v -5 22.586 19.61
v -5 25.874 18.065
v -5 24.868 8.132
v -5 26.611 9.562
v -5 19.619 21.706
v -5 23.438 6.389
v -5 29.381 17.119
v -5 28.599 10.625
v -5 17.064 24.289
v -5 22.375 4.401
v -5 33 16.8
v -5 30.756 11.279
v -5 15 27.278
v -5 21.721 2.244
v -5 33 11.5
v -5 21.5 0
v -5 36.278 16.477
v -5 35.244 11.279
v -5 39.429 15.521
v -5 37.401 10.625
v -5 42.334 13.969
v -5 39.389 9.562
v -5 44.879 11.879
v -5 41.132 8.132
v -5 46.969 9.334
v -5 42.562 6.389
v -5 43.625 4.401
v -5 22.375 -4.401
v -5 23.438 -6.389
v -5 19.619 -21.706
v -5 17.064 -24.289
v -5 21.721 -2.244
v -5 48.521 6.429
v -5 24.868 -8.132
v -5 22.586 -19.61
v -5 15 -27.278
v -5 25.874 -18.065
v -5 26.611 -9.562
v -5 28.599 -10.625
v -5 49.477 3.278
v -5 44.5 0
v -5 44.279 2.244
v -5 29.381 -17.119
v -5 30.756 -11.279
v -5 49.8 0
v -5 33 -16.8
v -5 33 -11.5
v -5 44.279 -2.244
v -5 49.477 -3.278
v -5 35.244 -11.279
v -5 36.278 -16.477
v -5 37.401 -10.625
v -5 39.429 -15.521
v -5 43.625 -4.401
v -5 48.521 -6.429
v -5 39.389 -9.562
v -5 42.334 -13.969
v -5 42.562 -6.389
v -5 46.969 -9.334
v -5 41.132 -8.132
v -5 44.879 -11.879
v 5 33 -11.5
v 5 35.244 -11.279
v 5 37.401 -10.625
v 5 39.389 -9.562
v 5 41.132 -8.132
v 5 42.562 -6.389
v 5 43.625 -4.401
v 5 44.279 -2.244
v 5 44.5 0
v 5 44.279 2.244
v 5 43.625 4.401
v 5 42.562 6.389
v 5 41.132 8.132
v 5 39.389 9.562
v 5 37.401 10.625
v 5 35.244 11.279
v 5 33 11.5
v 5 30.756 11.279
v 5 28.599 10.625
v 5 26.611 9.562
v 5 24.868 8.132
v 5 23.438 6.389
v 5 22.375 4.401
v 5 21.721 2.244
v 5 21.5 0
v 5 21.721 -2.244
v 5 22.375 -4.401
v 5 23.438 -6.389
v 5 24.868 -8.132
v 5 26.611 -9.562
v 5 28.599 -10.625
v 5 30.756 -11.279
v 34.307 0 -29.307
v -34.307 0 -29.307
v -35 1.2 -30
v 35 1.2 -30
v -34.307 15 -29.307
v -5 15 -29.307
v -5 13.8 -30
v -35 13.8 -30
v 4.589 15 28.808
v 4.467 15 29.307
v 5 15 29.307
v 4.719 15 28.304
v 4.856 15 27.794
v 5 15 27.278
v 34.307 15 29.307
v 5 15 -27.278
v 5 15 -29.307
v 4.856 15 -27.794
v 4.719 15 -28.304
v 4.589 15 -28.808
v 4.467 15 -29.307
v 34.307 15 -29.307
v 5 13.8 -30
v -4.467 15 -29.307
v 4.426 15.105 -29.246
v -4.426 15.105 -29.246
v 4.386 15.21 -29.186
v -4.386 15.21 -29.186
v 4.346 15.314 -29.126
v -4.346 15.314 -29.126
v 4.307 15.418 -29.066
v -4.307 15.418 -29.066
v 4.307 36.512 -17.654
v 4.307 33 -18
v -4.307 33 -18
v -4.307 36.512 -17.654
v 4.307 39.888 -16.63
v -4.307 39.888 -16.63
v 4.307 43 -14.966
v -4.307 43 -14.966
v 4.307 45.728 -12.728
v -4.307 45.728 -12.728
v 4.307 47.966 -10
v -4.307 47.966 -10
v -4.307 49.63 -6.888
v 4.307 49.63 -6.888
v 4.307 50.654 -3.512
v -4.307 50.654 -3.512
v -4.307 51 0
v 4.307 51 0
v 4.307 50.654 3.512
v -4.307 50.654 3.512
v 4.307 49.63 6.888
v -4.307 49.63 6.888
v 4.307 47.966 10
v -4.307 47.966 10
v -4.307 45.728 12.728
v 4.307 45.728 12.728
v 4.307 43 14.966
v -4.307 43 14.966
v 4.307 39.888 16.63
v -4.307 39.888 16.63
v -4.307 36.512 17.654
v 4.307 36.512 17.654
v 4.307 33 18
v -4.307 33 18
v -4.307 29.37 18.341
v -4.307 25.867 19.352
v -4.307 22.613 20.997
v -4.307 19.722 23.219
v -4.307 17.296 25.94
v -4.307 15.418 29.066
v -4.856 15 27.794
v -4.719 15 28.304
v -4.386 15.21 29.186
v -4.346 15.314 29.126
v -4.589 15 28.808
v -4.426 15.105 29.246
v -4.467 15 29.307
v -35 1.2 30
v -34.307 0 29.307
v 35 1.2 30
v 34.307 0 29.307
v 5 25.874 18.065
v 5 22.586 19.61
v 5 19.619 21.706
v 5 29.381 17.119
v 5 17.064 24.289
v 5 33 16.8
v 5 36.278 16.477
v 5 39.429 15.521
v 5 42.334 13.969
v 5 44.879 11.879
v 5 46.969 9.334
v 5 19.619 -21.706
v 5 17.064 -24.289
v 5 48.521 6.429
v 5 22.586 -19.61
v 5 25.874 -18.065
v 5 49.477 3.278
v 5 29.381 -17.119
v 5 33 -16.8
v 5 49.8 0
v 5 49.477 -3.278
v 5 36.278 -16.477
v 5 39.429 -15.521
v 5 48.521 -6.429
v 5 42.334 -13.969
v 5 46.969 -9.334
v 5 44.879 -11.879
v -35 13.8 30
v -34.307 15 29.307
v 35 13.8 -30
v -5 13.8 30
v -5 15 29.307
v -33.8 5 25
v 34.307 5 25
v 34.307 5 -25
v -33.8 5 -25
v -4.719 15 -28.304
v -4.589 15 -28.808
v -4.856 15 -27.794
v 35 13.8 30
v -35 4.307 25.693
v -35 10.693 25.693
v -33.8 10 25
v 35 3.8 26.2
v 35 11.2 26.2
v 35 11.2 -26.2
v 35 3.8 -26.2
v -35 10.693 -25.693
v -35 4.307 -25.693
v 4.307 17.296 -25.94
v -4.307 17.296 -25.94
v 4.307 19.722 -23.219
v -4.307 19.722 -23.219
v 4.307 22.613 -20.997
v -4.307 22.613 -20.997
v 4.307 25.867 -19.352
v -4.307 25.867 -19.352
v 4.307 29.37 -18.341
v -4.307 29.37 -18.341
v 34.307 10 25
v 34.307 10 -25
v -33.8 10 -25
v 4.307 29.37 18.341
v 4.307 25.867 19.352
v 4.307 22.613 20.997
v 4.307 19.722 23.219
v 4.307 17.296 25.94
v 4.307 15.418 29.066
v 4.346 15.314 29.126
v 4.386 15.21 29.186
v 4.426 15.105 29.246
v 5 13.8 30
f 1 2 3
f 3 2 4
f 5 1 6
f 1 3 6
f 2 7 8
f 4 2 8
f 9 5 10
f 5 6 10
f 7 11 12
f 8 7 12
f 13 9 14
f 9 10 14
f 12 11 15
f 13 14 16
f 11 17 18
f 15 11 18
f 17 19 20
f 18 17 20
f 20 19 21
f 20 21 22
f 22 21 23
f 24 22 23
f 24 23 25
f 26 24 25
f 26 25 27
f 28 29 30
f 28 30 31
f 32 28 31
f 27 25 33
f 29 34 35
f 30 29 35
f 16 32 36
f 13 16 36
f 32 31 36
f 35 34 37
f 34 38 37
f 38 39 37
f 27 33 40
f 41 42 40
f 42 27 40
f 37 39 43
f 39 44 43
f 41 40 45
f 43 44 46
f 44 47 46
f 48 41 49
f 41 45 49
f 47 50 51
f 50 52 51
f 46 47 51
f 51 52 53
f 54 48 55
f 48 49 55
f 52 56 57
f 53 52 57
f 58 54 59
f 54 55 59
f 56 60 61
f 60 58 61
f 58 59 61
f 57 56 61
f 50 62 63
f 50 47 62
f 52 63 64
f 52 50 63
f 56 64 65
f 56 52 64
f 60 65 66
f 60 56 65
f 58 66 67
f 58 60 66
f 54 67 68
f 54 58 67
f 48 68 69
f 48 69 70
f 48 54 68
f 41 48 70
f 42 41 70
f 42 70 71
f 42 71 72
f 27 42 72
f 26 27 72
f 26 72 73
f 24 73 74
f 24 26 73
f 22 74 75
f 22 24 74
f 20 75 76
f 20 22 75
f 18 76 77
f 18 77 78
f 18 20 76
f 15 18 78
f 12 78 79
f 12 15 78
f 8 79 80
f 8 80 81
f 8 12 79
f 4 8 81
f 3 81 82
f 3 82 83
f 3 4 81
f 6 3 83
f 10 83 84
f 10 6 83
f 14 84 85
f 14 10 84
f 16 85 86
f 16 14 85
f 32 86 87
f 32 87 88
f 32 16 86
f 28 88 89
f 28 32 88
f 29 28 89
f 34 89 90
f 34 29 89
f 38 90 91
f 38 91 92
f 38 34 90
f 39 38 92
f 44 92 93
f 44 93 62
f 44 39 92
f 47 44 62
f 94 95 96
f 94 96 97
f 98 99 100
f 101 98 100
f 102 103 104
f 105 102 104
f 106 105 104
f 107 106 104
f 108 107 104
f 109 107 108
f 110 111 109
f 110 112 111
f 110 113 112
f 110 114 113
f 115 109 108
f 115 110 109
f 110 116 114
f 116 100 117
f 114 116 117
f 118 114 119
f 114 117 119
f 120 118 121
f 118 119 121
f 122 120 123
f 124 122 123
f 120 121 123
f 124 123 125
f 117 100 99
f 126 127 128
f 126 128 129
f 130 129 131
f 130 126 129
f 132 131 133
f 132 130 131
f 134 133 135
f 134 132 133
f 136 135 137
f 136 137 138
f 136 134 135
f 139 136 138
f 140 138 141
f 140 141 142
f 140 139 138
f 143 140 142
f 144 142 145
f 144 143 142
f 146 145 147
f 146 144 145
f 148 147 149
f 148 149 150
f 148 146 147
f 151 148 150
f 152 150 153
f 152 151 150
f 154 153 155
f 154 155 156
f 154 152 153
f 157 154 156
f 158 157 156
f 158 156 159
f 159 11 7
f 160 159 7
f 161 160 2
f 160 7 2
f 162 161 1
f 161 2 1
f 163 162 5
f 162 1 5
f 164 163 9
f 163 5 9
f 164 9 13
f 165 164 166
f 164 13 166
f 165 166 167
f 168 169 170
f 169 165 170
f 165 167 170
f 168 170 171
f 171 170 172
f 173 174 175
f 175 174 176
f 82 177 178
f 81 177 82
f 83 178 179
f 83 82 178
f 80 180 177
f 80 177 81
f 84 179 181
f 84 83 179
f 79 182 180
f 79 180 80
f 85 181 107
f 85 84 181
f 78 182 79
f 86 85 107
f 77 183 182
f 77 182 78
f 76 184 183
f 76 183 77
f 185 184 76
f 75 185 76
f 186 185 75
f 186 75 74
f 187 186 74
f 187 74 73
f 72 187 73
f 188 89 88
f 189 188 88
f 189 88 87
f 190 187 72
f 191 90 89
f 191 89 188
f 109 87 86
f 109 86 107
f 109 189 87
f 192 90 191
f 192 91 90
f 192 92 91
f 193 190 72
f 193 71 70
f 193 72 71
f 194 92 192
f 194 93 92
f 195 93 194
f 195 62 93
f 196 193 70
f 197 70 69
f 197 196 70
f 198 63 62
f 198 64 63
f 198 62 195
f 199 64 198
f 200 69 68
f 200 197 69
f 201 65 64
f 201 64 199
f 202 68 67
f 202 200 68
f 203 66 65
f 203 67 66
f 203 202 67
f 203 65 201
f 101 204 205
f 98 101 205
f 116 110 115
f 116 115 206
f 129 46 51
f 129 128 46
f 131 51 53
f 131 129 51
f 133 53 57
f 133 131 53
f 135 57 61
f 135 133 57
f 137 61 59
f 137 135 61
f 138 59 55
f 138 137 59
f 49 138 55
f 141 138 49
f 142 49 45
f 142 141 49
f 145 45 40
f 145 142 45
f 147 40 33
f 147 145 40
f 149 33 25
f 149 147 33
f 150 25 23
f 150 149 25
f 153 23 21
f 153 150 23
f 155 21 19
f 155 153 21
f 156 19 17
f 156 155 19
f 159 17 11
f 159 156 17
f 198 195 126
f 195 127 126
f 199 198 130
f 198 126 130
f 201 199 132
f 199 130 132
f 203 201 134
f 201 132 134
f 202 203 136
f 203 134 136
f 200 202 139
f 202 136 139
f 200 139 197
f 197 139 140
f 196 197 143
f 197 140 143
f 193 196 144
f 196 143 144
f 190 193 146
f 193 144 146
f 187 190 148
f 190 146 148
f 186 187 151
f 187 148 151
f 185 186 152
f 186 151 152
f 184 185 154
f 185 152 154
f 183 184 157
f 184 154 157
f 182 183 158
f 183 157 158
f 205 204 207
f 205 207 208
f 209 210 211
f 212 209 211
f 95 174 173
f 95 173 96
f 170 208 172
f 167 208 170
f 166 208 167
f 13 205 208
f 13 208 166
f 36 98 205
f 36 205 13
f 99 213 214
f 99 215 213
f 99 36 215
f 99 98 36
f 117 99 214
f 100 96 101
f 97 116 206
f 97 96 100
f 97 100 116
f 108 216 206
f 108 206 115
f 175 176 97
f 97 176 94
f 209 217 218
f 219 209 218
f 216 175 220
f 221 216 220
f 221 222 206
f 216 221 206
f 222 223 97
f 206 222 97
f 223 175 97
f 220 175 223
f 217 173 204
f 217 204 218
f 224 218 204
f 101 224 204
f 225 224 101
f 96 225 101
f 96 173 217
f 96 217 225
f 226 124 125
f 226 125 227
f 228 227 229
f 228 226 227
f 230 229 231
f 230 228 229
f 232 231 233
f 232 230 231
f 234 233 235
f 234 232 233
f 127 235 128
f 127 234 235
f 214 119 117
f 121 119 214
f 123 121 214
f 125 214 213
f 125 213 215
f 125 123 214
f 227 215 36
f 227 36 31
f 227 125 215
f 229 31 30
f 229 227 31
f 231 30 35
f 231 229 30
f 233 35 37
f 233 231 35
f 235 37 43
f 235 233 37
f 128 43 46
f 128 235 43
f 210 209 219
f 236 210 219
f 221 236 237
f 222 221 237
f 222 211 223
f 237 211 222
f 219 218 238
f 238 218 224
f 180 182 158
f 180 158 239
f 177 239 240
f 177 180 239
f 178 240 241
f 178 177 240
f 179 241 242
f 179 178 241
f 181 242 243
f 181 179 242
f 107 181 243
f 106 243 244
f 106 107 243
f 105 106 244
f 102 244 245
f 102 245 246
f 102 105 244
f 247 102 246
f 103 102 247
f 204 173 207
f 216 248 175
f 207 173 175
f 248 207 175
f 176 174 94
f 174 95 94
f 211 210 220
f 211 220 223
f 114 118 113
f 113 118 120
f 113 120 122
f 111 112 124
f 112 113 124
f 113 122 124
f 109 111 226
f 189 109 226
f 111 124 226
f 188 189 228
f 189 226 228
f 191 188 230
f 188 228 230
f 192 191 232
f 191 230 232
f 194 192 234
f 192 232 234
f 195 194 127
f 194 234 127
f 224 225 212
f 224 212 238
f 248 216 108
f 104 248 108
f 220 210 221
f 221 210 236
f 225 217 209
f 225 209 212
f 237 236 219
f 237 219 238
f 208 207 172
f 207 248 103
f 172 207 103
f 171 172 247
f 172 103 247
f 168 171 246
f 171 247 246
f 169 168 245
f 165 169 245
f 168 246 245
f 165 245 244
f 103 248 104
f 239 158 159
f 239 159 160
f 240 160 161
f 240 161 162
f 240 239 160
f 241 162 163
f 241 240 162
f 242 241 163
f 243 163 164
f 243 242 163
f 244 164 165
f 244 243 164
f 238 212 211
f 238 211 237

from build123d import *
from OCP.BRepFilletAPI import BRepFilletAPI_MakeChamfer

# Parameters (mm, degrees)
SKETCH_1_W               = 70
SKETCH_1_H               = 60
EXTRUDE_1_DEPTH          = 15
SKETCH_2_R               = 11.5
EXTRUDE_3_DEPTH          = 5
CUT_EXTRUDE_1_DEPTH      = 69.745908969
CUT_EXTRUDE_1_DEPTH_BACK = 69.745908969
SKETCH_3_W               = 50
SKETCH_3_H               = 5
CHAMFER_1_SIZE           = 1.2
CHAMFER_1_SIZE2          = 0.692820323
CHAMFER_2_SIZE           = 1.2
CHAMFER_2_SIZE_2         = 0.692820323
CHAMFER_3_SIZE           = 1.2
CHAMFER_3_SIZE_2         = 0.692820323
CHAMFER_4_SIZE           = 1.2
CHAMFER_4_SIZE2          = 0.692820323


with BuildPart() as part:
    # 스케치1 → 보스-돌출1 (new body)
    with BuildSketch(Plane(origin=(0, 0, 0), x_dir=(1, 0, 0), z_dir=(0, 1, 0))):
        Rectangle(SKETCH_1_W, SKETCH_1_H)
    extrude(amount=EXTRUDE_1_DEPTH)

    # 스케치2 → 보스-돌출3 (add, symmetric)
    with BuildSketch(Plane(origin=(0, 0, 0), x_dir=(0, 0, -1), z_dir=(1, 0, 0))):
        with BuildLine():
            ThreePointArc((30, 15), (21.27501926, 22.183346174), (18, 33))
            ThreePointArc((18, 33), (0, 51), (-18, 33))
            ThreePointArc((-18, 33), (-21.27501926, 22.183346174), (-30, 15))
            Line((-30, 15), (30, 15))
        make_face()
        with Locations((0, 33)):
            Circle(SKETCH_2_R, mode=Mode.SUBTRACT)
    extrude(amount=EXTRUDE_3_DEPTH, both=True)

    # 스케치3 → 컷-돌출1 (cut, two sides: drawn at the far end of the back side and taken through both)
    with BuildSketch(Plane(origin=(0, 0, 0), x_dir=(0, 0, -1), z_dir=(1, 0, 0)).offset(-CUT_EXTRUDE_1_DEPTH_BACK)):
        with Locations((0, 7.5)):
            Rectangle(SKETCH_3_W, SKETCH_3_H)
    extrude(amount=CUT_EXTRUDE_1_DEPTH + CUT_EXTRUDE_1_DEPTH_BACK, mode=Mode.SUBTRACT)

    # 모따기1: one chamfer whose edges measure the first distance from different faces: ONE call of the kernel's chamfer builder (chamfer() names one face for all edges)
    chamfer_1_edges_1 = [part.edges().sort_by_distance(p)[0] for p in [
        (0, 0, 30),
    ]]
    chamfer_1_side_1 = [part.faces().sort_by_distance(p)[0] for p in [
        (0, 7.5, 30),
    ]]
    chamfer_1_edges_2 = [part.edges().sort_by_distance(p)[0] for p in [
        (-35, 0, 0),
    ]]
    chamfer_1_side_2 = [part.faces().sort_by_distance(p)[0] for p in [
        (-35, 7.5, -29.381534156),
    ]]
    chamfer_1_edges_3 = [part.edges().sort_by_distance(p)[0] for p in [
        (0, 0, -30),
    ]]
    chamfer_1_side_3 = [part.faces().sort_by_distance(p)[0] for p in [
        (0, 7.5, -30),
    ]]
    chamfer_1_edges_4 = [part.edges().sort_by_distance(p)[0] for p in [
        (35, 0, 0),
    ]]
    chamfer_1_side_4 = [part.faces().sort_by_distance(p)[0] for p in [
        (35, 7.5, 29.381534156),
    ]]
    chamfer_1 = BRepFilletAPI_MakeChamfer(part.part.solid().wrapped)
    for e in chamfer_1_edges_1:
        chamfer_1.Add(CHAMFER_1_SIZE, CHAMFER_1_SIZE2, e.wrapped, chamfer_1_side_1[0].wrapped)  # the first distance lies on this face
    for e in chamfer_1_edges_2:
        chamfer_1.Add(CHAMFER_1_SIZE, CHAMFER_1_SIZE2, e.wrapped, chamfer_1_side_2[0].wrapped)  # the first distance lies on this face
    for e in chamfer_1_edges_3:
        chamfer_1.Add(CHAMFER_1_SIZE, CHAMFER_1_SIZE2, e.wrapped, chamfer_1_side_3[0].wrapped)  # the first distance lies on this face
    for e in chamfer_1_edges_4:
        chamfer_1.Add(CHAMFER_1_SIZE, CHAMFER_1_SIZE2, e.wrapped, chamfer_1_side_4[0].wrapped)  # the first distance lies on this face
    add(Compound.cast(chamfer_1.Shape()), mode=Mode.REPLACE)

    # 모따기2
    # the kernel refuses this chamfer: 1.2, 0.98830445, 0.692820323 mm, written as the material it takes off along each edge
    with BuildSketch(Plane(origin=(-35, 15, -33.104502906), x_dir=(0, -1, 0), z_dir=(0, 0, 1)), Plane(origin=(35, 15, 33.104502906), x_dir=(0, -1, 0), z_dir=(0, 0, -1))) as chamfer_2_piece_1:
        Polygon((CHAMFER_2_SIZE, 0), (0, CHAMFER_2_SIZE_2), (0, 0), align=None)
    extrude(amount=66.209005811, mode=Mode.SUBTRACT)
    with BuildSketch(Plane(origin=(-5, 15, -30), x_dir=(0, 0, 1), z_dir=(-1, 0, 0)), Plane(origin=(38.104502906, 15, -30), x_dir=(0, 0, 1), z_dir=(-1, 0, 0))) as chamfer_2_piece_2:
        Polygon((CHAMFER_2_SIZE_2, 0), (0, -CHAMFER_2_SIZE), (0, 0), align=None)
    extrude(amount=33.104502906, mode=Mode.SUBTRACT)
    with BuildSketch(Plane(origin=(5, 15, 30), x_dir=(0, -1, 0), z_dir=(1, 0, 0)), Plane(origin=(-38.104502906, 15, 30), x_dir=(0, -1, 0), z_dir=(1, 0, 0))) as chamfer_2_piece_3:
        Polygon((CHAMFER_2_SIZE, 0), (0, CHAMFER_2_SIZE_2), (0, 0), align=None)
    extrude(amount=33.104502906, mode=Mode.SUBTRACT)
    with BuildSketch(Plane(origin=(-5, 15, -30), x_dir=(0, -1, 0), z_dir=(1, 0, 0)), Plane(origin=(5, 15, 30), x_dir=(0, -1, 0), z_dir=(-1, 0, 0))) as chamfer_2_piece_4:
        with BuildLine():
            Line((CHAMFER_2_SIZE, 0), (-0.41845847, -0.934417434))
            ThreePointArc((-0.41845847, -0.934417434), (-0.211061153, -0.487718993), (0, 0))
            Line((0, 0), (CHAMFER_2_SIZE, 0))
        make_face()
    extrude(amount=10, mode=Mode.SUBTRACT)

    # 모따기3
    # the kernel refuses this chamfer: 1.2, 0.692820323 mm, written as the material it takes off along each edge
    with BuildSketch(Plane(origin=(5, 33, -37.5), x_dir=(0, -0.958795780822353, 0.2840961996881595), z_dir=(0, -0.2840961996881595, -0.958795780822353))) as chamfer_3_piece_1_section:
        Polygon((19.5 + CHAMFER_3_SIZE, 0), (19.5, CHAMFER_3_SIZE_2), (19.5, 0), align=None)
    chamfer_3_piece_1 = revolve(axis=Axis((5, 33, -37.5), (-1, 0, 0)), revolution_arc=73.495168323, mode=Mode.PRIVATE)
    chamfer_3_piece_1 = split(chamfer_3_piece_1, bisect_by=Plane(origin=(5, 15, -37.5), z_dir=(0, 1, 0)), keep=Keep.TOP, mode=Mode.PRIVATE)
    add(chamfer_3_piece_1, mode=Mode.SUBTRACT)
    with BuildSketch(Plane(origin=(5, 33, 37.5), x_dir=(0, 0, -1), z_dir=(0, 1, 0))) as chamfer_3_piece_2_section:
        Polygon((19.5, CHAMFER_3_SIZE_2), (19.5 + CHAMFER_3_SIZE, 0), (19.5, 0), align=None)
    chamfer_3_piece_2 = revolve(axis=Axis((5, 33, 37.5), (-1, 0, 0)), revolution_arc=73.495168323, mode=Mode.PRIVATE)
    chamfer_3_piece_2 = split(chamfer_3_piece_2, bisect_by=Plane(origin=(5, 15, 37.5), z_dir=(0, 1, 0)), keep=Keep.TOP, mode=Mode.PRIVATE)
    add(chamfer_3_piece_2, mode=Mode.SUBTRACT)
    with BuildSketch(Plane(origin=(5, 33, 0), x_dir=(0, 0, -1), z_dir=(0, -1, 0))) as chamfer_3_piece_3:
        Polygon((18 - CHAMFER_3_SIZE, 0), (18, -CHAMFER_3_SIZE_2), (18, 0), align=None)
    revolve(axis=Axis((5, 33, 0), (1, 0, 0)), revolution_arc=180, mode=Mode.SUBTRACT)
    with BuildSketch(Plane(origin=(-5, 33, -37.5), x_dir=(0, -0.958795780822353, 0.2840961996881595), z_dir=(0, -0.2840961996881595, -0.958795780822353))) as chamfer_3_piece_4_section:
        Polygon((19.5 + CHAMFER_3_SIZE, 0), (19.5, -CHAMFER_3_SIZE_2), (19.5, 0), align=None)
    chamfer_3_piece_4 = revolve(axis=Axis((-5, 33, -37.5), (-1, 0, 0)), revolution_arc=73.495168323, mode=Mode.PRIVATE)
    chamfer_3_piece_4 = split(chamfer_3_piece_4, bisect_by=Plane(origin=(-5, 15, -37.5), z_dir=(0, 1, 0)), keep=Keep.TOP, mode=Mode.PRIVATE)
    add(chamfer_3_piece_4, mode=Mode.SUBTRACT)
    with BuildSketch(Plane(origin=(-5, 33, 0), x_dir=(0, 0, -1), z_dir=(0, -1, 0))) as chamfer_3_piece_5:
        Polygon((18 - CHAMFER_3_SIZE, 0), (18, CHAMFER_3_SIZE_2), (18, 0), align=None)
    revolve(axis=Axis((-5, 33, 0), (1, 0, 0)), revolution_arc=180, mode=Mode.SUBTRACT)
    with BuildSketch(Plane(origin=(-5, 33, 37.5), x_dir=(0, 0, -1), z_dir=(0, 1, 0))) as chamfer_3_piece_6_section:
        Polygon((19.5, -CHAMFER_3_SIZE_2), (19.5 + CHAMFER_3_SIZE, 0), (19.5, 0), align=None)
    chamfer_3_piece_6 = revolve(axis=Axis((-5, 33, 37.5), (-1, 0, 0)), revolution_arc=73.495168323, mode=Mode.PRIVATE)
    chamfer_3_piece_6 = split(chamfer_3_piece_6, bisect_by=Plane(origin=(-5, 15, 37.5), z_dir=(0, 1, 0)), keep=Keep.TOP, mode=Mode.PRIVATE)
    add(chamfer_3_piece_6, mode=Mode.SUBTRACT)

    # 모따기4: one chamfer whose edges measure the first distance from different faces: ONE call of the kernel's chamfer builder (chamfer() names one face for all edges)
    chamfer_4_edges_1 = [part.edges().sort_by_distance(p)[0] for p in [
        (-35, 7.5, 25),
    ]]
    chamfer_4_side_1 = [part.faces().sort_by_distance(p)[0] for p in [
        (0, 7.5, 25),
    ]]
    chamfer_4_edges_2 = [part.edges().sort_by_distance(p)[0] for p in [
        (-35, 10, 0),
    ]]
    chamfer_4_side_2 = [part.faces().sort_by_distance(p)[0] for p in [
        (0, 10, 0),
    ]]
    chamfer_4_edges_3 = [part.edges().sort_by_distance(p)[0] for p in [
        (-35, 7.5, -25),
    ]]
    chamfer_4_side_3 = [part.faces().sort_by_distance(p)[0] for p in [
        (0, 7.5, -25),
    ]]
    chamfer_4_edges_4 = [part.edges().sort_by_distance(p)[0] for p in [
        (-35, 5, 0),
    ]]
    chamfer_4_side_4 = [part.faces().sort_by_distance(p)[0] for p in [
        (0, 5, 0),
    ]]
    chamfer_4_edges_5 = [part.edges().sort_by_distance(p)[0] for p in [
        (35, 7.5, 25),
        (35, 5, 0),
        (35, 7.5, -25),
        (35, 10, 0),
    ]]
    chamfer_4_side_5 = [part.faces().sort_by_distance(p)[0] for p in [
        (35, 1.813087269, 0),
    ]]
    chamfer_4 = BRepFilletAPI_MakeChamfer(part.part.solid().wrapped)
    for e in chamfer_4_edges_1:
        chamfer_4.Add(CHAMFER_4_SIZE, CHAMFER_4_SIZE2, e.wrapped, chamfer_4_side_1[0].wrapped)  # the first distance lies on this face
    for e in chamfer_4_edges_2:
        chamfer_4.Add(CHAMFER_4_SIZE, CHAMFER_4_SIZE2, e.wrapped, chamfer_4_side_2[0].wrapped)  # the first distance lies on this face
    for e in chamfer_4_edges_3:
        chamfer_4.Add(CHAMFER_4_SIZE, CHAMFER_4_SIZE2, e.wrapped, chamfer_4_side_3[0].wrapped)  # the first distance lies on this face
    for e in chamfer_4_edges_4:
        chamfer_4.Add(CHAMFER_4_SIZE, CHAMFER_4_SIZE2, e.wrapped, chamfer_4_side_4[0].wrapped)  # the first distance lies on this face
    for e in chamfer_4_edges_5:
        chamfer_4.Add(CHAMFER_4_SIZE, CHAMFER_4_SIZE2, e.wrapped, chamfer_4_side_5[0].wrapped)  # the first distance lies on this face
    add(Compound.cast(chamfer_4.Shape()), mode=Mode.REPLACE)


solid = part.part
